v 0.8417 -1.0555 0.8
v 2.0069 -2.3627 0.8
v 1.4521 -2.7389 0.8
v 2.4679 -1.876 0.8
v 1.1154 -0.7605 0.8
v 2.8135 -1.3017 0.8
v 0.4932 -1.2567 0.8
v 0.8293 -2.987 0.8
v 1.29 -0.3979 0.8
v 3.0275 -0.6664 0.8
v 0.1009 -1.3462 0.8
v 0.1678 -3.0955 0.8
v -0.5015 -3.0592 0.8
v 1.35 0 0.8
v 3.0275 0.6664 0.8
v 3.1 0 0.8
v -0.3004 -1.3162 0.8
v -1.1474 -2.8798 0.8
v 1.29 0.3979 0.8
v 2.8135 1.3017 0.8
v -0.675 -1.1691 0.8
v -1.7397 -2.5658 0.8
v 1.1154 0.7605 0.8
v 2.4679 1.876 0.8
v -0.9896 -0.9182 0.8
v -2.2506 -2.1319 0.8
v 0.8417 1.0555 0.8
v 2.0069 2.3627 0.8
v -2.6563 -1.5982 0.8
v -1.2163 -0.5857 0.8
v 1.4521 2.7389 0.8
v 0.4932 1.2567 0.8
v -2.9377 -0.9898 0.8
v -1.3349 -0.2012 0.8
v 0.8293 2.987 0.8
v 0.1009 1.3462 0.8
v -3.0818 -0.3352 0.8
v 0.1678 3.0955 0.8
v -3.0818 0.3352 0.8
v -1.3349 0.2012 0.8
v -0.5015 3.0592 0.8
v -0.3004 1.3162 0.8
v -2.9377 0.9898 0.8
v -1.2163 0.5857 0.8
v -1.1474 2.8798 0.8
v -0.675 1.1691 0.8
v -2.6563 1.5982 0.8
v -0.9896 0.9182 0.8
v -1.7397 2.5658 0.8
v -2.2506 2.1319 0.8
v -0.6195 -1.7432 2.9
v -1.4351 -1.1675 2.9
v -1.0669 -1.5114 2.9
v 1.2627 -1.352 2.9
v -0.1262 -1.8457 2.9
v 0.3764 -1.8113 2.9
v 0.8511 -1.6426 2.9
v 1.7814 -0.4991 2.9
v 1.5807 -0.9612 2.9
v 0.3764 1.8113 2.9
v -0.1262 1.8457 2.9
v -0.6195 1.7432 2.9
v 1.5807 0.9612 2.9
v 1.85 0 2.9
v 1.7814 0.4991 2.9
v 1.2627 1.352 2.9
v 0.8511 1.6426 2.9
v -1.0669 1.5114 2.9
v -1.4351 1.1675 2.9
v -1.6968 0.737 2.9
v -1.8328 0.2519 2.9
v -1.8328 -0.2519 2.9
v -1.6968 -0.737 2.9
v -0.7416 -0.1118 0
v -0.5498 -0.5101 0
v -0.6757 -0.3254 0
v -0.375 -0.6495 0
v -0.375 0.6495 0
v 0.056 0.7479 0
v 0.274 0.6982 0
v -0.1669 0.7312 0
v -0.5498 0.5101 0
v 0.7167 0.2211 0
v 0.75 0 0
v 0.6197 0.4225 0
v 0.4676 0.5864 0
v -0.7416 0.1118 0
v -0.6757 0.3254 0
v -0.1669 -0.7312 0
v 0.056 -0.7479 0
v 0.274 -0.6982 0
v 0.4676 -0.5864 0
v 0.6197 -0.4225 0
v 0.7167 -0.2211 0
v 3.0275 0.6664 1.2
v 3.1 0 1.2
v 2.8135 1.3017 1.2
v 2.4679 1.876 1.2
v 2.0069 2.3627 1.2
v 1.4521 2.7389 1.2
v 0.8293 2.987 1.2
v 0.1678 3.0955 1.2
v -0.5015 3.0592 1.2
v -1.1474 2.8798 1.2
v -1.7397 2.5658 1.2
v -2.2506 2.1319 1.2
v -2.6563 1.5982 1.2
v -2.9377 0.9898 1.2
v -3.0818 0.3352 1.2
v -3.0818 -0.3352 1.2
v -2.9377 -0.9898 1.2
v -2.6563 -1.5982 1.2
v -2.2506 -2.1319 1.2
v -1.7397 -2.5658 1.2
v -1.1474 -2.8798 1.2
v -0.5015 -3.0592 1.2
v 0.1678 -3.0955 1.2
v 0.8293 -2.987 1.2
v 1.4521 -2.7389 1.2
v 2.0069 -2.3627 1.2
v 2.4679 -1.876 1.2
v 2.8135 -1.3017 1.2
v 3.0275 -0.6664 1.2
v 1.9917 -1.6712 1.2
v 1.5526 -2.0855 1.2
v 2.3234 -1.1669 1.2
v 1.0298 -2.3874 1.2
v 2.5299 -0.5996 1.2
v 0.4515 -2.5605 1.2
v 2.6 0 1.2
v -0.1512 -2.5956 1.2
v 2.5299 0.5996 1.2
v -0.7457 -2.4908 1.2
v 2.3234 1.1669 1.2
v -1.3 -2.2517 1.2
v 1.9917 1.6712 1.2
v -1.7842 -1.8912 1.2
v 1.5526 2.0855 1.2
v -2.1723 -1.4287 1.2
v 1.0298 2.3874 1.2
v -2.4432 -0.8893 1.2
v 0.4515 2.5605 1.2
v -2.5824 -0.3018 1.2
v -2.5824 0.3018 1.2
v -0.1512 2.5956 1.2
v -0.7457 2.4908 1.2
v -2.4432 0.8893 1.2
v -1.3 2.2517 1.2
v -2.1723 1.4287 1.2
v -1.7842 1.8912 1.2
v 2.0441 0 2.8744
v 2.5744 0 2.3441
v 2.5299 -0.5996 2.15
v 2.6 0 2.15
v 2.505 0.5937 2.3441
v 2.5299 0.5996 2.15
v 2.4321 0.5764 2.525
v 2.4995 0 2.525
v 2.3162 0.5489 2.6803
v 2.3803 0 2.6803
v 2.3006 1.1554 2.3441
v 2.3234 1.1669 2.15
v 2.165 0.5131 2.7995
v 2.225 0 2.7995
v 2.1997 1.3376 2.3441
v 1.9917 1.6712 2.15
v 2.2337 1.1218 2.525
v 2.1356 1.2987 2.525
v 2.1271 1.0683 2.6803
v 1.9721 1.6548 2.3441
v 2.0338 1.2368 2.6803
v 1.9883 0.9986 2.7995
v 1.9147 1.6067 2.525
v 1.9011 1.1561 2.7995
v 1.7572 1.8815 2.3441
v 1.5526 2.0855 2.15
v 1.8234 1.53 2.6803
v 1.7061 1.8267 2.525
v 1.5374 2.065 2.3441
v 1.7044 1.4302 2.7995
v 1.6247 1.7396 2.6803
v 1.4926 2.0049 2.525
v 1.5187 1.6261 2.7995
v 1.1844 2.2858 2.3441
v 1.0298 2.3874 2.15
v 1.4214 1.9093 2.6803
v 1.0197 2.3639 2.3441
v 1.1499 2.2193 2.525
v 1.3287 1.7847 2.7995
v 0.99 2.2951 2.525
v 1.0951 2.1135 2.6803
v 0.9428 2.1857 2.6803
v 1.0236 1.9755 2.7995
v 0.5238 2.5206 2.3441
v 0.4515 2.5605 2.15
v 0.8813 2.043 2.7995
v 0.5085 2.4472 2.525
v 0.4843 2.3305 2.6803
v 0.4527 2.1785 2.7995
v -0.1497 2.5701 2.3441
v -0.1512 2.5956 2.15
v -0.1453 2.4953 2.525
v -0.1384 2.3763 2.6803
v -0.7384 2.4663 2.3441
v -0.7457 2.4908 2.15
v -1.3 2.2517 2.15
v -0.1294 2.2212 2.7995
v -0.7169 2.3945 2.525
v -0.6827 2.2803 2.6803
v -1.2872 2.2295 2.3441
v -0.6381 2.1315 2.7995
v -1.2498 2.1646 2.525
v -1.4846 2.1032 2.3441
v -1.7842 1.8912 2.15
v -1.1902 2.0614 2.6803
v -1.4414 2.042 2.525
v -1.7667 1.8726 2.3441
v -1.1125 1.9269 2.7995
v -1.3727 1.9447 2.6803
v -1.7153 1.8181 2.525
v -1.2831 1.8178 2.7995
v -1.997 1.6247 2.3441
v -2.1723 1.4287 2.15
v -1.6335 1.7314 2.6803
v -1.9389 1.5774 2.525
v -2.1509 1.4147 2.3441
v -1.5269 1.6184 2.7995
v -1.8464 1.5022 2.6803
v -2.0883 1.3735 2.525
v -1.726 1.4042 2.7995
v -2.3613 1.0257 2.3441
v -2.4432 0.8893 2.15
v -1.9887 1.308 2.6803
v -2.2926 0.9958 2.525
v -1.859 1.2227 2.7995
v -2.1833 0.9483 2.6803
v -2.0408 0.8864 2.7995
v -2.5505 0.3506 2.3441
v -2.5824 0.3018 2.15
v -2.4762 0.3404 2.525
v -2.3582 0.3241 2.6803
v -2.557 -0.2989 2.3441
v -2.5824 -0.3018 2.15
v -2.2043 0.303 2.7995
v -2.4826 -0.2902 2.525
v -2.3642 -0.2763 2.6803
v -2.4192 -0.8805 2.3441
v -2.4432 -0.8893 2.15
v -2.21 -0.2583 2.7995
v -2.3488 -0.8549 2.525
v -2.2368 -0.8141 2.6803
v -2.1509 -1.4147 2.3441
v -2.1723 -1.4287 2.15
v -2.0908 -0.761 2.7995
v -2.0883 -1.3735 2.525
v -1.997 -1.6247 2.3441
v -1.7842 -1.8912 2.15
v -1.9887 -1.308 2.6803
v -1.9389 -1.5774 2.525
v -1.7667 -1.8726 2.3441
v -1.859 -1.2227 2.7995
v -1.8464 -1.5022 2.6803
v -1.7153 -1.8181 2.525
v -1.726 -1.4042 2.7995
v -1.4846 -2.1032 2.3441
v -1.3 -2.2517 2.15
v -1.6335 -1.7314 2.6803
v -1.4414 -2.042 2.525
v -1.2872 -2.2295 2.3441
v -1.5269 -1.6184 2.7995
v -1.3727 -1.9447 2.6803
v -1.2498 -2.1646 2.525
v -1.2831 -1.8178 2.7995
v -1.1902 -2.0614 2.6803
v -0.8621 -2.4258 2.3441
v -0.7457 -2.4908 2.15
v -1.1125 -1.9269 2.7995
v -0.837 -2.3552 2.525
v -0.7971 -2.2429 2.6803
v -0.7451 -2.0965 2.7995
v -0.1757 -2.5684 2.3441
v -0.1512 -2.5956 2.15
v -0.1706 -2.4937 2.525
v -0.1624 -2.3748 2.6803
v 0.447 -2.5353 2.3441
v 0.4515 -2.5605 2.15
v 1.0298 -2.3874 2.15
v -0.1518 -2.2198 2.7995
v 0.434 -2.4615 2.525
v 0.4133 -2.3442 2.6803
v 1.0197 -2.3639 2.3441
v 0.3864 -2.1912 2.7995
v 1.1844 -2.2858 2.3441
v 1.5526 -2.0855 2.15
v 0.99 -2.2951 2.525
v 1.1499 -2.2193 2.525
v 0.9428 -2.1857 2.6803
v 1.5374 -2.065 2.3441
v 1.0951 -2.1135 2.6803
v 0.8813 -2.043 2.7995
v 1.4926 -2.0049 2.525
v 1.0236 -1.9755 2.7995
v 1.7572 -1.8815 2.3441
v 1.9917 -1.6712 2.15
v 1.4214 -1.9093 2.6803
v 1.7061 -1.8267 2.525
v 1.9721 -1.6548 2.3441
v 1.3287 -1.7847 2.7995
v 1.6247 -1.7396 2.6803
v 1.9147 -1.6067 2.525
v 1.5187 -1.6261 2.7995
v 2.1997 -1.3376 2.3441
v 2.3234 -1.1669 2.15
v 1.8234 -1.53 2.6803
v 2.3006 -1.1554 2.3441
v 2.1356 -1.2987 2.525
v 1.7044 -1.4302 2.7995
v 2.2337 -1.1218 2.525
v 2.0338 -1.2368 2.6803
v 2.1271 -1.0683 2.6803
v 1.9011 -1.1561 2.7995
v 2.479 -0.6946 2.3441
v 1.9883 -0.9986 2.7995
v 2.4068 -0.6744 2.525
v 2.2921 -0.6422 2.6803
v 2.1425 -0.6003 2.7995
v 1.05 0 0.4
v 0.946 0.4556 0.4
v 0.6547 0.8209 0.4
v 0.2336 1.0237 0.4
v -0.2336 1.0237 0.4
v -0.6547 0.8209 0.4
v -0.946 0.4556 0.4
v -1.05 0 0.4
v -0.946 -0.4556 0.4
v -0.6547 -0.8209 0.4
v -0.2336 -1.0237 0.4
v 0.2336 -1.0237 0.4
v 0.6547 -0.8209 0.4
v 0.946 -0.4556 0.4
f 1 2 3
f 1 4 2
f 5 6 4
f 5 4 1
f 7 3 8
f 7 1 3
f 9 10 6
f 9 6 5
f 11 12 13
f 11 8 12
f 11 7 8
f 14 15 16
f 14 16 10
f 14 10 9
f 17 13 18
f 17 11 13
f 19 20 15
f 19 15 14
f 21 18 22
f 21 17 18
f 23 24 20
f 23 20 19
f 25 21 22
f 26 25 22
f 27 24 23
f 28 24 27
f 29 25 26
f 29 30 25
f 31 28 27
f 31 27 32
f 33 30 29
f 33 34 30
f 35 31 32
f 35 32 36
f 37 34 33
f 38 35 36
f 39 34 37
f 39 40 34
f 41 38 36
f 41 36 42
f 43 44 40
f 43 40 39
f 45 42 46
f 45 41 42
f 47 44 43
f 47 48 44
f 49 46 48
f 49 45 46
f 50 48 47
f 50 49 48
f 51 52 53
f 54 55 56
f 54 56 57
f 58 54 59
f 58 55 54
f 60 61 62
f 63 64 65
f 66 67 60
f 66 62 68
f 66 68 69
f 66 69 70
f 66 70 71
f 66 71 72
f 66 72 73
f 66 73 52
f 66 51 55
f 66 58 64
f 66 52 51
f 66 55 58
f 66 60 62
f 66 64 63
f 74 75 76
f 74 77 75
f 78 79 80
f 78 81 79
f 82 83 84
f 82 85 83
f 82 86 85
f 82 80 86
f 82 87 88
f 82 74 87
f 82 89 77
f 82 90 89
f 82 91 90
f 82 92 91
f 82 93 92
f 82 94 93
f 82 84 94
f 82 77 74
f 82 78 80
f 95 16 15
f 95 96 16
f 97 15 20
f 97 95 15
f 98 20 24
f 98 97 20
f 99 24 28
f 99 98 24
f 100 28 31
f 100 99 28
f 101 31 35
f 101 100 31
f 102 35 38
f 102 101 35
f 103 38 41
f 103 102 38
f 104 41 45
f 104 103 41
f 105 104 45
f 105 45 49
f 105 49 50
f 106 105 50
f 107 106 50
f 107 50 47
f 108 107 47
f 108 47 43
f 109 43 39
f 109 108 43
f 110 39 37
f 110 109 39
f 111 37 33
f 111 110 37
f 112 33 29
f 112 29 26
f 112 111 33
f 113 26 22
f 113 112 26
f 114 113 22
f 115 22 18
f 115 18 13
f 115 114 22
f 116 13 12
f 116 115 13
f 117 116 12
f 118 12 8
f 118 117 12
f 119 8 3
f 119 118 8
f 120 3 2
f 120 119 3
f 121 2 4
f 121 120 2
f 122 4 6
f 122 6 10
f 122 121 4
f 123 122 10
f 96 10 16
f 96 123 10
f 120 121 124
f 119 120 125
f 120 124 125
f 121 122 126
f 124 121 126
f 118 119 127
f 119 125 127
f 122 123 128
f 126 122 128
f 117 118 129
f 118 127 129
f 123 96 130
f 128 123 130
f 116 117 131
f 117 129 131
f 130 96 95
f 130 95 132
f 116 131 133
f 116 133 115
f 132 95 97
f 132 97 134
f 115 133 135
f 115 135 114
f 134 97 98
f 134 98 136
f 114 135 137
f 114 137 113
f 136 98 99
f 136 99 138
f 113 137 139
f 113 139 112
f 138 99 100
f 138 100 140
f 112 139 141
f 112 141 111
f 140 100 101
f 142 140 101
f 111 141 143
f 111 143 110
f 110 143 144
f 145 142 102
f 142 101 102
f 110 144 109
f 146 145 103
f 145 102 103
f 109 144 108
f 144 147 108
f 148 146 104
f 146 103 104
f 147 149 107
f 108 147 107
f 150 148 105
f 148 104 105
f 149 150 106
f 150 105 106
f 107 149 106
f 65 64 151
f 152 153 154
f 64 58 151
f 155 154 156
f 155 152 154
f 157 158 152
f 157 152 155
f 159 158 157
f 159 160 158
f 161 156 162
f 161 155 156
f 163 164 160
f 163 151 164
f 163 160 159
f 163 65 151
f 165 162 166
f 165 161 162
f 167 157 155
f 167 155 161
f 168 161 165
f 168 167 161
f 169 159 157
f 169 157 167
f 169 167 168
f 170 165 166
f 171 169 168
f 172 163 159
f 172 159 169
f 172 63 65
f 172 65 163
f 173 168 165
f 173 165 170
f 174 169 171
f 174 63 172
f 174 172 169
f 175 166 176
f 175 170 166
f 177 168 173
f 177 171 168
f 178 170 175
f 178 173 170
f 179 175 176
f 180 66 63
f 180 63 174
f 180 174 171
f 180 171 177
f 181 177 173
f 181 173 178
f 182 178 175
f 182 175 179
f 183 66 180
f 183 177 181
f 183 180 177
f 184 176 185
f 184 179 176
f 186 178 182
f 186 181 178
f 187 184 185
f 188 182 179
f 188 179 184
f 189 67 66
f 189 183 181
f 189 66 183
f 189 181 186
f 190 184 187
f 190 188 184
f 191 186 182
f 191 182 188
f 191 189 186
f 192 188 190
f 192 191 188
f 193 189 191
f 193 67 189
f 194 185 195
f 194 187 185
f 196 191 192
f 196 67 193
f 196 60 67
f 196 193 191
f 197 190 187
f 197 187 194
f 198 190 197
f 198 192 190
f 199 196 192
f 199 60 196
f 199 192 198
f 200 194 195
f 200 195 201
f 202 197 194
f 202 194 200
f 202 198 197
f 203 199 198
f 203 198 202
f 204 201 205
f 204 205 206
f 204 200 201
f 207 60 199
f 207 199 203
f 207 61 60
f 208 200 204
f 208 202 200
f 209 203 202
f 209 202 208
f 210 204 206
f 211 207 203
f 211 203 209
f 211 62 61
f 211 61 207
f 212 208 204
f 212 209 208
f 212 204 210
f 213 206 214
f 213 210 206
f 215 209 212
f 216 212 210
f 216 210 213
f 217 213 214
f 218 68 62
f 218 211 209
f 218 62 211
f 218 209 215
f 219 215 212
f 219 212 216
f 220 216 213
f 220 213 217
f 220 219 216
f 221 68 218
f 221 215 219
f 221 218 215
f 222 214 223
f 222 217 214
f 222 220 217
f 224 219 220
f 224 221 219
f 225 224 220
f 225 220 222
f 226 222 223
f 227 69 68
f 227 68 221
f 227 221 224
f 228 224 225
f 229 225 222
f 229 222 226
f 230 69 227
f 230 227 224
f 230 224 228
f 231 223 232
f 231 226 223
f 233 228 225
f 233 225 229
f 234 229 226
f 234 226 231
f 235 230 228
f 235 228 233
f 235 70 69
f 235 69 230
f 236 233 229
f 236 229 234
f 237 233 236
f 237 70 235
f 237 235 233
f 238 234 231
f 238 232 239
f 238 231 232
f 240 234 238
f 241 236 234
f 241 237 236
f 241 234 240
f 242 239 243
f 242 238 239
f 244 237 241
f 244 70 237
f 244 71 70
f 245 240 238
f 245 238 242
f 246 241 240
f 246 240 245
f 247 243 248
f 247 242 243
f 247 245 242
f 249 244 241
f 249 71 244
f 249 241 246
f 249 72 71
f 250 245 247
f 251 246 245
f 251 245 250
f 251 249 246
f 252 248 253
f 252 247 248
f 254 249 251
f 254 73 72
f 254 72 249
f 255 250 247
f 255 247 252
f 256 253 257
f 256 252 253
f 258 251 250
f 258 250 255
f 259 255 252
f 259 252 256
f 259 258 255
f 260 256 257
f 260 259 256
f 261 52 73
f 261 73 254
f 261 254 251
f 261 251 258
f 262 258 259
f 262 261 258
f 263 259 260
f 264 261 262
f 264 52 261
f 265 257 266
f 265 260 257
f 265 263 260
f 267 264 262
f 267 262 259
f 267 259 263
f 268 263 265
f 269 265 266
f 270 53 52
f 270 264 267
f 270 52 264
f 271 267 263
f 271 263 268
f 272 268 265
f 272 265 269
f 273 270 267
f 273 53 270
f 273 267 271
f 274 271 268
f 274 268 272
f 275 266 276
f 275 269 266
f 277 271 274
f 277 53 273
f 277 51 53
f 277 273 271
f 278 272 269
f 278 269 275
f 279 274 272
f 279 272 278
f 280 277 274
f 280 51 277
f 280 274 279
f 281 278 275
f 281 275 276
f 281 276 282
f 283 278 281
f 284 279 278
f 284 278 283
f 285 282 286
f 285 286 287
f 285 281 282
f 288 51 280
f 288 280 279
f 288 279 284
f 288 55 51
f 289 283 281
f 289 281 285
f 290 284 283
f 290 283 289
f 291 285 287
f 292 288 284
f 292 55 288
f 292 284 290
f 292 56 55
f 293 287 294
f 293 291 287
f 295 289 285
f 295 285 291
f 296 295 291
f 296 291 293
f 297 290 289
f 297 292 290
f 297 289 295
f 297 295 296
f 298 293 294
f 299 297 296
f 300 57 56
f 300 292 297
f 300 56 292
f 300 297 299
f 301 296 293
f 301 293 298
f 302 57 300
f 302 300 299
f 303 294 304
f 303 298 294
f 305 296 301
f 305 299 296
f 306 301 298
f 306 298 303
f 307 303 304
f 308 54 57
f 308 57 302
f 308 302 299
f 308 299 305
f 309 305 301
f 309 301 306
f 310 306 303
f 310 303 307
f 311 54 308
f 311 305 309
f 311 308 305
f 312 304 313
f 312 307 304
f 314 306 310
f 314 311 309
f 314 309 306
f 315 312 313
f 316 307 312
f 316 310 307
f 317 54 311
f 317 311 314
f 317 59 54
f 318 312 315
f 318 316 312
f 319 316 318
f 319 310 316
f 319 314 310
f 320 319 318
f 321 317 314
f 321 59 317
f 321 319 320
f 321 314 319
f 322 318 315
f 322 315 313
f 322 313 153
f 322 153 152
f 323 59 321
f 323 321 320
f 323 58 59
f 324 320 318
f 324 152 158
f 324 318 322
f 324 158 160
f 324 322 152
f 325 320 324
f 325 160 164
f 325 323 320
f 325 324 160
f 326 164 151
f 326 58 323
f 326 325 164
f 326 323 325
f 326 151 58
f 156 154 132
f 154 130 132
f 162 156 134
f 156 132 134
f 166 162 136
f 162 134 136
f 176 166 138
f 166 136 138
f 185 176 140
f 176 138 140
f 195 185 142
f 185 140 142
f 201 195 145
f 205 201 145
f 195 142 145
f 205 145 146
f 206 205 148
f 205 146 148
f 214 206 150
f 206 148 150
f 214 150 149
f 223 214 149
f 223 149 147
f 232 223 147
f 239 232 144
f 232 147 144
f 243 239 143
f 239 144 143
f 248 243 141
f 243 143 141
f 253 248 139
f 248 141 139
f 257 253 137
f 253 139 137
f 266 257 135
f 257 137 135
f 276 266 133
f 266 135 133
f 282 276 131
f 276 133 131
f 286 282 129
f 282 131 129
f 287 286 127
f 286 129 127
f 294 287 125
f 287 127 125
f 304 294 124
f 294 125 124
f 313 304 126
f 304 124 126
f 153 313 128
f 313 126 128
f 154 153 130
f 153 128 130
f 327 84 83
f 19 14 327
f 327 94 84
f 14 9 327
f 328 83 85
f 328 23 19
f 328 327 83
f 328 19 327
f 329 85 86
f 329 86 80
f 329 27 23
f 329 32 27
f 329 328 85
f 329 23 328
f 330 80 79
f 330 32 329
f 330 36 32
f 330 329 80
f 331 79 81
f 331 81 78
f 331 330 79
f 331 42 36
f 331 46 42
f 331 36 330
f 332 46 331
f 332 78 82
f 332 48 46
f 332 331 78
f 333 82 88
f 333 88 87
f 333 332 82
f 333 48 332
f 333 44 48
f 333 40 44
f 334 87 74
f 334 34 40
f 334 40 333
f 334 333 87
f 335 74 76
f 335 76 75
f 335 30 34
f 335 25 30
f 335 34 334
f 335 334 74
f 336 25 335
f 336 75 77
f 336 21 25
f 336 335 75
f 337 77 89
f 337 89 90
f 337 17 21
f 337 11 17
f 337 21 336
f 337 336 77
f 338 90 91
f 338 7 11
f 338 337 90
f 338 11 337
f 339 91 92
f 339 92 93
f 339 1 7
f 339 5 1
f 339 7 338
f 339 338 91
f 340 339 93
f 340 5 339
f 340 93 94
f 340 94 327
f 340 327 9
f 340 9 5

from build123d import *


with BuildPart() as part:
    # Sketch → Revolution (revolve)
    with BuildSketch(Plane.XZ):
        with BuildLine():
            Line((0, 0), (0.75, 0))
            Line((0.75, 0), (1.350002, 0.8))
            Line((1.350002, 0.8), (3.1, 0.8))
            Line((3.1, 0.8), (3.1, 1.2))
            Line((2.6, 1.2), (3.1, 1.2))
            Line((2.6, 2.15), (2.6, 1.2))
            ThreePointArc((2.6, 2.15), (2.38033, 2.68033), (1.85, 2.9))
            Line((1.85, 2.9), (0, 2.9))
            Line((0, 2.9), (0, 0))
        make_face()
    revolve(axis=Axis((0, 0, 0), (0, 0, 1)))


solid = part.part
